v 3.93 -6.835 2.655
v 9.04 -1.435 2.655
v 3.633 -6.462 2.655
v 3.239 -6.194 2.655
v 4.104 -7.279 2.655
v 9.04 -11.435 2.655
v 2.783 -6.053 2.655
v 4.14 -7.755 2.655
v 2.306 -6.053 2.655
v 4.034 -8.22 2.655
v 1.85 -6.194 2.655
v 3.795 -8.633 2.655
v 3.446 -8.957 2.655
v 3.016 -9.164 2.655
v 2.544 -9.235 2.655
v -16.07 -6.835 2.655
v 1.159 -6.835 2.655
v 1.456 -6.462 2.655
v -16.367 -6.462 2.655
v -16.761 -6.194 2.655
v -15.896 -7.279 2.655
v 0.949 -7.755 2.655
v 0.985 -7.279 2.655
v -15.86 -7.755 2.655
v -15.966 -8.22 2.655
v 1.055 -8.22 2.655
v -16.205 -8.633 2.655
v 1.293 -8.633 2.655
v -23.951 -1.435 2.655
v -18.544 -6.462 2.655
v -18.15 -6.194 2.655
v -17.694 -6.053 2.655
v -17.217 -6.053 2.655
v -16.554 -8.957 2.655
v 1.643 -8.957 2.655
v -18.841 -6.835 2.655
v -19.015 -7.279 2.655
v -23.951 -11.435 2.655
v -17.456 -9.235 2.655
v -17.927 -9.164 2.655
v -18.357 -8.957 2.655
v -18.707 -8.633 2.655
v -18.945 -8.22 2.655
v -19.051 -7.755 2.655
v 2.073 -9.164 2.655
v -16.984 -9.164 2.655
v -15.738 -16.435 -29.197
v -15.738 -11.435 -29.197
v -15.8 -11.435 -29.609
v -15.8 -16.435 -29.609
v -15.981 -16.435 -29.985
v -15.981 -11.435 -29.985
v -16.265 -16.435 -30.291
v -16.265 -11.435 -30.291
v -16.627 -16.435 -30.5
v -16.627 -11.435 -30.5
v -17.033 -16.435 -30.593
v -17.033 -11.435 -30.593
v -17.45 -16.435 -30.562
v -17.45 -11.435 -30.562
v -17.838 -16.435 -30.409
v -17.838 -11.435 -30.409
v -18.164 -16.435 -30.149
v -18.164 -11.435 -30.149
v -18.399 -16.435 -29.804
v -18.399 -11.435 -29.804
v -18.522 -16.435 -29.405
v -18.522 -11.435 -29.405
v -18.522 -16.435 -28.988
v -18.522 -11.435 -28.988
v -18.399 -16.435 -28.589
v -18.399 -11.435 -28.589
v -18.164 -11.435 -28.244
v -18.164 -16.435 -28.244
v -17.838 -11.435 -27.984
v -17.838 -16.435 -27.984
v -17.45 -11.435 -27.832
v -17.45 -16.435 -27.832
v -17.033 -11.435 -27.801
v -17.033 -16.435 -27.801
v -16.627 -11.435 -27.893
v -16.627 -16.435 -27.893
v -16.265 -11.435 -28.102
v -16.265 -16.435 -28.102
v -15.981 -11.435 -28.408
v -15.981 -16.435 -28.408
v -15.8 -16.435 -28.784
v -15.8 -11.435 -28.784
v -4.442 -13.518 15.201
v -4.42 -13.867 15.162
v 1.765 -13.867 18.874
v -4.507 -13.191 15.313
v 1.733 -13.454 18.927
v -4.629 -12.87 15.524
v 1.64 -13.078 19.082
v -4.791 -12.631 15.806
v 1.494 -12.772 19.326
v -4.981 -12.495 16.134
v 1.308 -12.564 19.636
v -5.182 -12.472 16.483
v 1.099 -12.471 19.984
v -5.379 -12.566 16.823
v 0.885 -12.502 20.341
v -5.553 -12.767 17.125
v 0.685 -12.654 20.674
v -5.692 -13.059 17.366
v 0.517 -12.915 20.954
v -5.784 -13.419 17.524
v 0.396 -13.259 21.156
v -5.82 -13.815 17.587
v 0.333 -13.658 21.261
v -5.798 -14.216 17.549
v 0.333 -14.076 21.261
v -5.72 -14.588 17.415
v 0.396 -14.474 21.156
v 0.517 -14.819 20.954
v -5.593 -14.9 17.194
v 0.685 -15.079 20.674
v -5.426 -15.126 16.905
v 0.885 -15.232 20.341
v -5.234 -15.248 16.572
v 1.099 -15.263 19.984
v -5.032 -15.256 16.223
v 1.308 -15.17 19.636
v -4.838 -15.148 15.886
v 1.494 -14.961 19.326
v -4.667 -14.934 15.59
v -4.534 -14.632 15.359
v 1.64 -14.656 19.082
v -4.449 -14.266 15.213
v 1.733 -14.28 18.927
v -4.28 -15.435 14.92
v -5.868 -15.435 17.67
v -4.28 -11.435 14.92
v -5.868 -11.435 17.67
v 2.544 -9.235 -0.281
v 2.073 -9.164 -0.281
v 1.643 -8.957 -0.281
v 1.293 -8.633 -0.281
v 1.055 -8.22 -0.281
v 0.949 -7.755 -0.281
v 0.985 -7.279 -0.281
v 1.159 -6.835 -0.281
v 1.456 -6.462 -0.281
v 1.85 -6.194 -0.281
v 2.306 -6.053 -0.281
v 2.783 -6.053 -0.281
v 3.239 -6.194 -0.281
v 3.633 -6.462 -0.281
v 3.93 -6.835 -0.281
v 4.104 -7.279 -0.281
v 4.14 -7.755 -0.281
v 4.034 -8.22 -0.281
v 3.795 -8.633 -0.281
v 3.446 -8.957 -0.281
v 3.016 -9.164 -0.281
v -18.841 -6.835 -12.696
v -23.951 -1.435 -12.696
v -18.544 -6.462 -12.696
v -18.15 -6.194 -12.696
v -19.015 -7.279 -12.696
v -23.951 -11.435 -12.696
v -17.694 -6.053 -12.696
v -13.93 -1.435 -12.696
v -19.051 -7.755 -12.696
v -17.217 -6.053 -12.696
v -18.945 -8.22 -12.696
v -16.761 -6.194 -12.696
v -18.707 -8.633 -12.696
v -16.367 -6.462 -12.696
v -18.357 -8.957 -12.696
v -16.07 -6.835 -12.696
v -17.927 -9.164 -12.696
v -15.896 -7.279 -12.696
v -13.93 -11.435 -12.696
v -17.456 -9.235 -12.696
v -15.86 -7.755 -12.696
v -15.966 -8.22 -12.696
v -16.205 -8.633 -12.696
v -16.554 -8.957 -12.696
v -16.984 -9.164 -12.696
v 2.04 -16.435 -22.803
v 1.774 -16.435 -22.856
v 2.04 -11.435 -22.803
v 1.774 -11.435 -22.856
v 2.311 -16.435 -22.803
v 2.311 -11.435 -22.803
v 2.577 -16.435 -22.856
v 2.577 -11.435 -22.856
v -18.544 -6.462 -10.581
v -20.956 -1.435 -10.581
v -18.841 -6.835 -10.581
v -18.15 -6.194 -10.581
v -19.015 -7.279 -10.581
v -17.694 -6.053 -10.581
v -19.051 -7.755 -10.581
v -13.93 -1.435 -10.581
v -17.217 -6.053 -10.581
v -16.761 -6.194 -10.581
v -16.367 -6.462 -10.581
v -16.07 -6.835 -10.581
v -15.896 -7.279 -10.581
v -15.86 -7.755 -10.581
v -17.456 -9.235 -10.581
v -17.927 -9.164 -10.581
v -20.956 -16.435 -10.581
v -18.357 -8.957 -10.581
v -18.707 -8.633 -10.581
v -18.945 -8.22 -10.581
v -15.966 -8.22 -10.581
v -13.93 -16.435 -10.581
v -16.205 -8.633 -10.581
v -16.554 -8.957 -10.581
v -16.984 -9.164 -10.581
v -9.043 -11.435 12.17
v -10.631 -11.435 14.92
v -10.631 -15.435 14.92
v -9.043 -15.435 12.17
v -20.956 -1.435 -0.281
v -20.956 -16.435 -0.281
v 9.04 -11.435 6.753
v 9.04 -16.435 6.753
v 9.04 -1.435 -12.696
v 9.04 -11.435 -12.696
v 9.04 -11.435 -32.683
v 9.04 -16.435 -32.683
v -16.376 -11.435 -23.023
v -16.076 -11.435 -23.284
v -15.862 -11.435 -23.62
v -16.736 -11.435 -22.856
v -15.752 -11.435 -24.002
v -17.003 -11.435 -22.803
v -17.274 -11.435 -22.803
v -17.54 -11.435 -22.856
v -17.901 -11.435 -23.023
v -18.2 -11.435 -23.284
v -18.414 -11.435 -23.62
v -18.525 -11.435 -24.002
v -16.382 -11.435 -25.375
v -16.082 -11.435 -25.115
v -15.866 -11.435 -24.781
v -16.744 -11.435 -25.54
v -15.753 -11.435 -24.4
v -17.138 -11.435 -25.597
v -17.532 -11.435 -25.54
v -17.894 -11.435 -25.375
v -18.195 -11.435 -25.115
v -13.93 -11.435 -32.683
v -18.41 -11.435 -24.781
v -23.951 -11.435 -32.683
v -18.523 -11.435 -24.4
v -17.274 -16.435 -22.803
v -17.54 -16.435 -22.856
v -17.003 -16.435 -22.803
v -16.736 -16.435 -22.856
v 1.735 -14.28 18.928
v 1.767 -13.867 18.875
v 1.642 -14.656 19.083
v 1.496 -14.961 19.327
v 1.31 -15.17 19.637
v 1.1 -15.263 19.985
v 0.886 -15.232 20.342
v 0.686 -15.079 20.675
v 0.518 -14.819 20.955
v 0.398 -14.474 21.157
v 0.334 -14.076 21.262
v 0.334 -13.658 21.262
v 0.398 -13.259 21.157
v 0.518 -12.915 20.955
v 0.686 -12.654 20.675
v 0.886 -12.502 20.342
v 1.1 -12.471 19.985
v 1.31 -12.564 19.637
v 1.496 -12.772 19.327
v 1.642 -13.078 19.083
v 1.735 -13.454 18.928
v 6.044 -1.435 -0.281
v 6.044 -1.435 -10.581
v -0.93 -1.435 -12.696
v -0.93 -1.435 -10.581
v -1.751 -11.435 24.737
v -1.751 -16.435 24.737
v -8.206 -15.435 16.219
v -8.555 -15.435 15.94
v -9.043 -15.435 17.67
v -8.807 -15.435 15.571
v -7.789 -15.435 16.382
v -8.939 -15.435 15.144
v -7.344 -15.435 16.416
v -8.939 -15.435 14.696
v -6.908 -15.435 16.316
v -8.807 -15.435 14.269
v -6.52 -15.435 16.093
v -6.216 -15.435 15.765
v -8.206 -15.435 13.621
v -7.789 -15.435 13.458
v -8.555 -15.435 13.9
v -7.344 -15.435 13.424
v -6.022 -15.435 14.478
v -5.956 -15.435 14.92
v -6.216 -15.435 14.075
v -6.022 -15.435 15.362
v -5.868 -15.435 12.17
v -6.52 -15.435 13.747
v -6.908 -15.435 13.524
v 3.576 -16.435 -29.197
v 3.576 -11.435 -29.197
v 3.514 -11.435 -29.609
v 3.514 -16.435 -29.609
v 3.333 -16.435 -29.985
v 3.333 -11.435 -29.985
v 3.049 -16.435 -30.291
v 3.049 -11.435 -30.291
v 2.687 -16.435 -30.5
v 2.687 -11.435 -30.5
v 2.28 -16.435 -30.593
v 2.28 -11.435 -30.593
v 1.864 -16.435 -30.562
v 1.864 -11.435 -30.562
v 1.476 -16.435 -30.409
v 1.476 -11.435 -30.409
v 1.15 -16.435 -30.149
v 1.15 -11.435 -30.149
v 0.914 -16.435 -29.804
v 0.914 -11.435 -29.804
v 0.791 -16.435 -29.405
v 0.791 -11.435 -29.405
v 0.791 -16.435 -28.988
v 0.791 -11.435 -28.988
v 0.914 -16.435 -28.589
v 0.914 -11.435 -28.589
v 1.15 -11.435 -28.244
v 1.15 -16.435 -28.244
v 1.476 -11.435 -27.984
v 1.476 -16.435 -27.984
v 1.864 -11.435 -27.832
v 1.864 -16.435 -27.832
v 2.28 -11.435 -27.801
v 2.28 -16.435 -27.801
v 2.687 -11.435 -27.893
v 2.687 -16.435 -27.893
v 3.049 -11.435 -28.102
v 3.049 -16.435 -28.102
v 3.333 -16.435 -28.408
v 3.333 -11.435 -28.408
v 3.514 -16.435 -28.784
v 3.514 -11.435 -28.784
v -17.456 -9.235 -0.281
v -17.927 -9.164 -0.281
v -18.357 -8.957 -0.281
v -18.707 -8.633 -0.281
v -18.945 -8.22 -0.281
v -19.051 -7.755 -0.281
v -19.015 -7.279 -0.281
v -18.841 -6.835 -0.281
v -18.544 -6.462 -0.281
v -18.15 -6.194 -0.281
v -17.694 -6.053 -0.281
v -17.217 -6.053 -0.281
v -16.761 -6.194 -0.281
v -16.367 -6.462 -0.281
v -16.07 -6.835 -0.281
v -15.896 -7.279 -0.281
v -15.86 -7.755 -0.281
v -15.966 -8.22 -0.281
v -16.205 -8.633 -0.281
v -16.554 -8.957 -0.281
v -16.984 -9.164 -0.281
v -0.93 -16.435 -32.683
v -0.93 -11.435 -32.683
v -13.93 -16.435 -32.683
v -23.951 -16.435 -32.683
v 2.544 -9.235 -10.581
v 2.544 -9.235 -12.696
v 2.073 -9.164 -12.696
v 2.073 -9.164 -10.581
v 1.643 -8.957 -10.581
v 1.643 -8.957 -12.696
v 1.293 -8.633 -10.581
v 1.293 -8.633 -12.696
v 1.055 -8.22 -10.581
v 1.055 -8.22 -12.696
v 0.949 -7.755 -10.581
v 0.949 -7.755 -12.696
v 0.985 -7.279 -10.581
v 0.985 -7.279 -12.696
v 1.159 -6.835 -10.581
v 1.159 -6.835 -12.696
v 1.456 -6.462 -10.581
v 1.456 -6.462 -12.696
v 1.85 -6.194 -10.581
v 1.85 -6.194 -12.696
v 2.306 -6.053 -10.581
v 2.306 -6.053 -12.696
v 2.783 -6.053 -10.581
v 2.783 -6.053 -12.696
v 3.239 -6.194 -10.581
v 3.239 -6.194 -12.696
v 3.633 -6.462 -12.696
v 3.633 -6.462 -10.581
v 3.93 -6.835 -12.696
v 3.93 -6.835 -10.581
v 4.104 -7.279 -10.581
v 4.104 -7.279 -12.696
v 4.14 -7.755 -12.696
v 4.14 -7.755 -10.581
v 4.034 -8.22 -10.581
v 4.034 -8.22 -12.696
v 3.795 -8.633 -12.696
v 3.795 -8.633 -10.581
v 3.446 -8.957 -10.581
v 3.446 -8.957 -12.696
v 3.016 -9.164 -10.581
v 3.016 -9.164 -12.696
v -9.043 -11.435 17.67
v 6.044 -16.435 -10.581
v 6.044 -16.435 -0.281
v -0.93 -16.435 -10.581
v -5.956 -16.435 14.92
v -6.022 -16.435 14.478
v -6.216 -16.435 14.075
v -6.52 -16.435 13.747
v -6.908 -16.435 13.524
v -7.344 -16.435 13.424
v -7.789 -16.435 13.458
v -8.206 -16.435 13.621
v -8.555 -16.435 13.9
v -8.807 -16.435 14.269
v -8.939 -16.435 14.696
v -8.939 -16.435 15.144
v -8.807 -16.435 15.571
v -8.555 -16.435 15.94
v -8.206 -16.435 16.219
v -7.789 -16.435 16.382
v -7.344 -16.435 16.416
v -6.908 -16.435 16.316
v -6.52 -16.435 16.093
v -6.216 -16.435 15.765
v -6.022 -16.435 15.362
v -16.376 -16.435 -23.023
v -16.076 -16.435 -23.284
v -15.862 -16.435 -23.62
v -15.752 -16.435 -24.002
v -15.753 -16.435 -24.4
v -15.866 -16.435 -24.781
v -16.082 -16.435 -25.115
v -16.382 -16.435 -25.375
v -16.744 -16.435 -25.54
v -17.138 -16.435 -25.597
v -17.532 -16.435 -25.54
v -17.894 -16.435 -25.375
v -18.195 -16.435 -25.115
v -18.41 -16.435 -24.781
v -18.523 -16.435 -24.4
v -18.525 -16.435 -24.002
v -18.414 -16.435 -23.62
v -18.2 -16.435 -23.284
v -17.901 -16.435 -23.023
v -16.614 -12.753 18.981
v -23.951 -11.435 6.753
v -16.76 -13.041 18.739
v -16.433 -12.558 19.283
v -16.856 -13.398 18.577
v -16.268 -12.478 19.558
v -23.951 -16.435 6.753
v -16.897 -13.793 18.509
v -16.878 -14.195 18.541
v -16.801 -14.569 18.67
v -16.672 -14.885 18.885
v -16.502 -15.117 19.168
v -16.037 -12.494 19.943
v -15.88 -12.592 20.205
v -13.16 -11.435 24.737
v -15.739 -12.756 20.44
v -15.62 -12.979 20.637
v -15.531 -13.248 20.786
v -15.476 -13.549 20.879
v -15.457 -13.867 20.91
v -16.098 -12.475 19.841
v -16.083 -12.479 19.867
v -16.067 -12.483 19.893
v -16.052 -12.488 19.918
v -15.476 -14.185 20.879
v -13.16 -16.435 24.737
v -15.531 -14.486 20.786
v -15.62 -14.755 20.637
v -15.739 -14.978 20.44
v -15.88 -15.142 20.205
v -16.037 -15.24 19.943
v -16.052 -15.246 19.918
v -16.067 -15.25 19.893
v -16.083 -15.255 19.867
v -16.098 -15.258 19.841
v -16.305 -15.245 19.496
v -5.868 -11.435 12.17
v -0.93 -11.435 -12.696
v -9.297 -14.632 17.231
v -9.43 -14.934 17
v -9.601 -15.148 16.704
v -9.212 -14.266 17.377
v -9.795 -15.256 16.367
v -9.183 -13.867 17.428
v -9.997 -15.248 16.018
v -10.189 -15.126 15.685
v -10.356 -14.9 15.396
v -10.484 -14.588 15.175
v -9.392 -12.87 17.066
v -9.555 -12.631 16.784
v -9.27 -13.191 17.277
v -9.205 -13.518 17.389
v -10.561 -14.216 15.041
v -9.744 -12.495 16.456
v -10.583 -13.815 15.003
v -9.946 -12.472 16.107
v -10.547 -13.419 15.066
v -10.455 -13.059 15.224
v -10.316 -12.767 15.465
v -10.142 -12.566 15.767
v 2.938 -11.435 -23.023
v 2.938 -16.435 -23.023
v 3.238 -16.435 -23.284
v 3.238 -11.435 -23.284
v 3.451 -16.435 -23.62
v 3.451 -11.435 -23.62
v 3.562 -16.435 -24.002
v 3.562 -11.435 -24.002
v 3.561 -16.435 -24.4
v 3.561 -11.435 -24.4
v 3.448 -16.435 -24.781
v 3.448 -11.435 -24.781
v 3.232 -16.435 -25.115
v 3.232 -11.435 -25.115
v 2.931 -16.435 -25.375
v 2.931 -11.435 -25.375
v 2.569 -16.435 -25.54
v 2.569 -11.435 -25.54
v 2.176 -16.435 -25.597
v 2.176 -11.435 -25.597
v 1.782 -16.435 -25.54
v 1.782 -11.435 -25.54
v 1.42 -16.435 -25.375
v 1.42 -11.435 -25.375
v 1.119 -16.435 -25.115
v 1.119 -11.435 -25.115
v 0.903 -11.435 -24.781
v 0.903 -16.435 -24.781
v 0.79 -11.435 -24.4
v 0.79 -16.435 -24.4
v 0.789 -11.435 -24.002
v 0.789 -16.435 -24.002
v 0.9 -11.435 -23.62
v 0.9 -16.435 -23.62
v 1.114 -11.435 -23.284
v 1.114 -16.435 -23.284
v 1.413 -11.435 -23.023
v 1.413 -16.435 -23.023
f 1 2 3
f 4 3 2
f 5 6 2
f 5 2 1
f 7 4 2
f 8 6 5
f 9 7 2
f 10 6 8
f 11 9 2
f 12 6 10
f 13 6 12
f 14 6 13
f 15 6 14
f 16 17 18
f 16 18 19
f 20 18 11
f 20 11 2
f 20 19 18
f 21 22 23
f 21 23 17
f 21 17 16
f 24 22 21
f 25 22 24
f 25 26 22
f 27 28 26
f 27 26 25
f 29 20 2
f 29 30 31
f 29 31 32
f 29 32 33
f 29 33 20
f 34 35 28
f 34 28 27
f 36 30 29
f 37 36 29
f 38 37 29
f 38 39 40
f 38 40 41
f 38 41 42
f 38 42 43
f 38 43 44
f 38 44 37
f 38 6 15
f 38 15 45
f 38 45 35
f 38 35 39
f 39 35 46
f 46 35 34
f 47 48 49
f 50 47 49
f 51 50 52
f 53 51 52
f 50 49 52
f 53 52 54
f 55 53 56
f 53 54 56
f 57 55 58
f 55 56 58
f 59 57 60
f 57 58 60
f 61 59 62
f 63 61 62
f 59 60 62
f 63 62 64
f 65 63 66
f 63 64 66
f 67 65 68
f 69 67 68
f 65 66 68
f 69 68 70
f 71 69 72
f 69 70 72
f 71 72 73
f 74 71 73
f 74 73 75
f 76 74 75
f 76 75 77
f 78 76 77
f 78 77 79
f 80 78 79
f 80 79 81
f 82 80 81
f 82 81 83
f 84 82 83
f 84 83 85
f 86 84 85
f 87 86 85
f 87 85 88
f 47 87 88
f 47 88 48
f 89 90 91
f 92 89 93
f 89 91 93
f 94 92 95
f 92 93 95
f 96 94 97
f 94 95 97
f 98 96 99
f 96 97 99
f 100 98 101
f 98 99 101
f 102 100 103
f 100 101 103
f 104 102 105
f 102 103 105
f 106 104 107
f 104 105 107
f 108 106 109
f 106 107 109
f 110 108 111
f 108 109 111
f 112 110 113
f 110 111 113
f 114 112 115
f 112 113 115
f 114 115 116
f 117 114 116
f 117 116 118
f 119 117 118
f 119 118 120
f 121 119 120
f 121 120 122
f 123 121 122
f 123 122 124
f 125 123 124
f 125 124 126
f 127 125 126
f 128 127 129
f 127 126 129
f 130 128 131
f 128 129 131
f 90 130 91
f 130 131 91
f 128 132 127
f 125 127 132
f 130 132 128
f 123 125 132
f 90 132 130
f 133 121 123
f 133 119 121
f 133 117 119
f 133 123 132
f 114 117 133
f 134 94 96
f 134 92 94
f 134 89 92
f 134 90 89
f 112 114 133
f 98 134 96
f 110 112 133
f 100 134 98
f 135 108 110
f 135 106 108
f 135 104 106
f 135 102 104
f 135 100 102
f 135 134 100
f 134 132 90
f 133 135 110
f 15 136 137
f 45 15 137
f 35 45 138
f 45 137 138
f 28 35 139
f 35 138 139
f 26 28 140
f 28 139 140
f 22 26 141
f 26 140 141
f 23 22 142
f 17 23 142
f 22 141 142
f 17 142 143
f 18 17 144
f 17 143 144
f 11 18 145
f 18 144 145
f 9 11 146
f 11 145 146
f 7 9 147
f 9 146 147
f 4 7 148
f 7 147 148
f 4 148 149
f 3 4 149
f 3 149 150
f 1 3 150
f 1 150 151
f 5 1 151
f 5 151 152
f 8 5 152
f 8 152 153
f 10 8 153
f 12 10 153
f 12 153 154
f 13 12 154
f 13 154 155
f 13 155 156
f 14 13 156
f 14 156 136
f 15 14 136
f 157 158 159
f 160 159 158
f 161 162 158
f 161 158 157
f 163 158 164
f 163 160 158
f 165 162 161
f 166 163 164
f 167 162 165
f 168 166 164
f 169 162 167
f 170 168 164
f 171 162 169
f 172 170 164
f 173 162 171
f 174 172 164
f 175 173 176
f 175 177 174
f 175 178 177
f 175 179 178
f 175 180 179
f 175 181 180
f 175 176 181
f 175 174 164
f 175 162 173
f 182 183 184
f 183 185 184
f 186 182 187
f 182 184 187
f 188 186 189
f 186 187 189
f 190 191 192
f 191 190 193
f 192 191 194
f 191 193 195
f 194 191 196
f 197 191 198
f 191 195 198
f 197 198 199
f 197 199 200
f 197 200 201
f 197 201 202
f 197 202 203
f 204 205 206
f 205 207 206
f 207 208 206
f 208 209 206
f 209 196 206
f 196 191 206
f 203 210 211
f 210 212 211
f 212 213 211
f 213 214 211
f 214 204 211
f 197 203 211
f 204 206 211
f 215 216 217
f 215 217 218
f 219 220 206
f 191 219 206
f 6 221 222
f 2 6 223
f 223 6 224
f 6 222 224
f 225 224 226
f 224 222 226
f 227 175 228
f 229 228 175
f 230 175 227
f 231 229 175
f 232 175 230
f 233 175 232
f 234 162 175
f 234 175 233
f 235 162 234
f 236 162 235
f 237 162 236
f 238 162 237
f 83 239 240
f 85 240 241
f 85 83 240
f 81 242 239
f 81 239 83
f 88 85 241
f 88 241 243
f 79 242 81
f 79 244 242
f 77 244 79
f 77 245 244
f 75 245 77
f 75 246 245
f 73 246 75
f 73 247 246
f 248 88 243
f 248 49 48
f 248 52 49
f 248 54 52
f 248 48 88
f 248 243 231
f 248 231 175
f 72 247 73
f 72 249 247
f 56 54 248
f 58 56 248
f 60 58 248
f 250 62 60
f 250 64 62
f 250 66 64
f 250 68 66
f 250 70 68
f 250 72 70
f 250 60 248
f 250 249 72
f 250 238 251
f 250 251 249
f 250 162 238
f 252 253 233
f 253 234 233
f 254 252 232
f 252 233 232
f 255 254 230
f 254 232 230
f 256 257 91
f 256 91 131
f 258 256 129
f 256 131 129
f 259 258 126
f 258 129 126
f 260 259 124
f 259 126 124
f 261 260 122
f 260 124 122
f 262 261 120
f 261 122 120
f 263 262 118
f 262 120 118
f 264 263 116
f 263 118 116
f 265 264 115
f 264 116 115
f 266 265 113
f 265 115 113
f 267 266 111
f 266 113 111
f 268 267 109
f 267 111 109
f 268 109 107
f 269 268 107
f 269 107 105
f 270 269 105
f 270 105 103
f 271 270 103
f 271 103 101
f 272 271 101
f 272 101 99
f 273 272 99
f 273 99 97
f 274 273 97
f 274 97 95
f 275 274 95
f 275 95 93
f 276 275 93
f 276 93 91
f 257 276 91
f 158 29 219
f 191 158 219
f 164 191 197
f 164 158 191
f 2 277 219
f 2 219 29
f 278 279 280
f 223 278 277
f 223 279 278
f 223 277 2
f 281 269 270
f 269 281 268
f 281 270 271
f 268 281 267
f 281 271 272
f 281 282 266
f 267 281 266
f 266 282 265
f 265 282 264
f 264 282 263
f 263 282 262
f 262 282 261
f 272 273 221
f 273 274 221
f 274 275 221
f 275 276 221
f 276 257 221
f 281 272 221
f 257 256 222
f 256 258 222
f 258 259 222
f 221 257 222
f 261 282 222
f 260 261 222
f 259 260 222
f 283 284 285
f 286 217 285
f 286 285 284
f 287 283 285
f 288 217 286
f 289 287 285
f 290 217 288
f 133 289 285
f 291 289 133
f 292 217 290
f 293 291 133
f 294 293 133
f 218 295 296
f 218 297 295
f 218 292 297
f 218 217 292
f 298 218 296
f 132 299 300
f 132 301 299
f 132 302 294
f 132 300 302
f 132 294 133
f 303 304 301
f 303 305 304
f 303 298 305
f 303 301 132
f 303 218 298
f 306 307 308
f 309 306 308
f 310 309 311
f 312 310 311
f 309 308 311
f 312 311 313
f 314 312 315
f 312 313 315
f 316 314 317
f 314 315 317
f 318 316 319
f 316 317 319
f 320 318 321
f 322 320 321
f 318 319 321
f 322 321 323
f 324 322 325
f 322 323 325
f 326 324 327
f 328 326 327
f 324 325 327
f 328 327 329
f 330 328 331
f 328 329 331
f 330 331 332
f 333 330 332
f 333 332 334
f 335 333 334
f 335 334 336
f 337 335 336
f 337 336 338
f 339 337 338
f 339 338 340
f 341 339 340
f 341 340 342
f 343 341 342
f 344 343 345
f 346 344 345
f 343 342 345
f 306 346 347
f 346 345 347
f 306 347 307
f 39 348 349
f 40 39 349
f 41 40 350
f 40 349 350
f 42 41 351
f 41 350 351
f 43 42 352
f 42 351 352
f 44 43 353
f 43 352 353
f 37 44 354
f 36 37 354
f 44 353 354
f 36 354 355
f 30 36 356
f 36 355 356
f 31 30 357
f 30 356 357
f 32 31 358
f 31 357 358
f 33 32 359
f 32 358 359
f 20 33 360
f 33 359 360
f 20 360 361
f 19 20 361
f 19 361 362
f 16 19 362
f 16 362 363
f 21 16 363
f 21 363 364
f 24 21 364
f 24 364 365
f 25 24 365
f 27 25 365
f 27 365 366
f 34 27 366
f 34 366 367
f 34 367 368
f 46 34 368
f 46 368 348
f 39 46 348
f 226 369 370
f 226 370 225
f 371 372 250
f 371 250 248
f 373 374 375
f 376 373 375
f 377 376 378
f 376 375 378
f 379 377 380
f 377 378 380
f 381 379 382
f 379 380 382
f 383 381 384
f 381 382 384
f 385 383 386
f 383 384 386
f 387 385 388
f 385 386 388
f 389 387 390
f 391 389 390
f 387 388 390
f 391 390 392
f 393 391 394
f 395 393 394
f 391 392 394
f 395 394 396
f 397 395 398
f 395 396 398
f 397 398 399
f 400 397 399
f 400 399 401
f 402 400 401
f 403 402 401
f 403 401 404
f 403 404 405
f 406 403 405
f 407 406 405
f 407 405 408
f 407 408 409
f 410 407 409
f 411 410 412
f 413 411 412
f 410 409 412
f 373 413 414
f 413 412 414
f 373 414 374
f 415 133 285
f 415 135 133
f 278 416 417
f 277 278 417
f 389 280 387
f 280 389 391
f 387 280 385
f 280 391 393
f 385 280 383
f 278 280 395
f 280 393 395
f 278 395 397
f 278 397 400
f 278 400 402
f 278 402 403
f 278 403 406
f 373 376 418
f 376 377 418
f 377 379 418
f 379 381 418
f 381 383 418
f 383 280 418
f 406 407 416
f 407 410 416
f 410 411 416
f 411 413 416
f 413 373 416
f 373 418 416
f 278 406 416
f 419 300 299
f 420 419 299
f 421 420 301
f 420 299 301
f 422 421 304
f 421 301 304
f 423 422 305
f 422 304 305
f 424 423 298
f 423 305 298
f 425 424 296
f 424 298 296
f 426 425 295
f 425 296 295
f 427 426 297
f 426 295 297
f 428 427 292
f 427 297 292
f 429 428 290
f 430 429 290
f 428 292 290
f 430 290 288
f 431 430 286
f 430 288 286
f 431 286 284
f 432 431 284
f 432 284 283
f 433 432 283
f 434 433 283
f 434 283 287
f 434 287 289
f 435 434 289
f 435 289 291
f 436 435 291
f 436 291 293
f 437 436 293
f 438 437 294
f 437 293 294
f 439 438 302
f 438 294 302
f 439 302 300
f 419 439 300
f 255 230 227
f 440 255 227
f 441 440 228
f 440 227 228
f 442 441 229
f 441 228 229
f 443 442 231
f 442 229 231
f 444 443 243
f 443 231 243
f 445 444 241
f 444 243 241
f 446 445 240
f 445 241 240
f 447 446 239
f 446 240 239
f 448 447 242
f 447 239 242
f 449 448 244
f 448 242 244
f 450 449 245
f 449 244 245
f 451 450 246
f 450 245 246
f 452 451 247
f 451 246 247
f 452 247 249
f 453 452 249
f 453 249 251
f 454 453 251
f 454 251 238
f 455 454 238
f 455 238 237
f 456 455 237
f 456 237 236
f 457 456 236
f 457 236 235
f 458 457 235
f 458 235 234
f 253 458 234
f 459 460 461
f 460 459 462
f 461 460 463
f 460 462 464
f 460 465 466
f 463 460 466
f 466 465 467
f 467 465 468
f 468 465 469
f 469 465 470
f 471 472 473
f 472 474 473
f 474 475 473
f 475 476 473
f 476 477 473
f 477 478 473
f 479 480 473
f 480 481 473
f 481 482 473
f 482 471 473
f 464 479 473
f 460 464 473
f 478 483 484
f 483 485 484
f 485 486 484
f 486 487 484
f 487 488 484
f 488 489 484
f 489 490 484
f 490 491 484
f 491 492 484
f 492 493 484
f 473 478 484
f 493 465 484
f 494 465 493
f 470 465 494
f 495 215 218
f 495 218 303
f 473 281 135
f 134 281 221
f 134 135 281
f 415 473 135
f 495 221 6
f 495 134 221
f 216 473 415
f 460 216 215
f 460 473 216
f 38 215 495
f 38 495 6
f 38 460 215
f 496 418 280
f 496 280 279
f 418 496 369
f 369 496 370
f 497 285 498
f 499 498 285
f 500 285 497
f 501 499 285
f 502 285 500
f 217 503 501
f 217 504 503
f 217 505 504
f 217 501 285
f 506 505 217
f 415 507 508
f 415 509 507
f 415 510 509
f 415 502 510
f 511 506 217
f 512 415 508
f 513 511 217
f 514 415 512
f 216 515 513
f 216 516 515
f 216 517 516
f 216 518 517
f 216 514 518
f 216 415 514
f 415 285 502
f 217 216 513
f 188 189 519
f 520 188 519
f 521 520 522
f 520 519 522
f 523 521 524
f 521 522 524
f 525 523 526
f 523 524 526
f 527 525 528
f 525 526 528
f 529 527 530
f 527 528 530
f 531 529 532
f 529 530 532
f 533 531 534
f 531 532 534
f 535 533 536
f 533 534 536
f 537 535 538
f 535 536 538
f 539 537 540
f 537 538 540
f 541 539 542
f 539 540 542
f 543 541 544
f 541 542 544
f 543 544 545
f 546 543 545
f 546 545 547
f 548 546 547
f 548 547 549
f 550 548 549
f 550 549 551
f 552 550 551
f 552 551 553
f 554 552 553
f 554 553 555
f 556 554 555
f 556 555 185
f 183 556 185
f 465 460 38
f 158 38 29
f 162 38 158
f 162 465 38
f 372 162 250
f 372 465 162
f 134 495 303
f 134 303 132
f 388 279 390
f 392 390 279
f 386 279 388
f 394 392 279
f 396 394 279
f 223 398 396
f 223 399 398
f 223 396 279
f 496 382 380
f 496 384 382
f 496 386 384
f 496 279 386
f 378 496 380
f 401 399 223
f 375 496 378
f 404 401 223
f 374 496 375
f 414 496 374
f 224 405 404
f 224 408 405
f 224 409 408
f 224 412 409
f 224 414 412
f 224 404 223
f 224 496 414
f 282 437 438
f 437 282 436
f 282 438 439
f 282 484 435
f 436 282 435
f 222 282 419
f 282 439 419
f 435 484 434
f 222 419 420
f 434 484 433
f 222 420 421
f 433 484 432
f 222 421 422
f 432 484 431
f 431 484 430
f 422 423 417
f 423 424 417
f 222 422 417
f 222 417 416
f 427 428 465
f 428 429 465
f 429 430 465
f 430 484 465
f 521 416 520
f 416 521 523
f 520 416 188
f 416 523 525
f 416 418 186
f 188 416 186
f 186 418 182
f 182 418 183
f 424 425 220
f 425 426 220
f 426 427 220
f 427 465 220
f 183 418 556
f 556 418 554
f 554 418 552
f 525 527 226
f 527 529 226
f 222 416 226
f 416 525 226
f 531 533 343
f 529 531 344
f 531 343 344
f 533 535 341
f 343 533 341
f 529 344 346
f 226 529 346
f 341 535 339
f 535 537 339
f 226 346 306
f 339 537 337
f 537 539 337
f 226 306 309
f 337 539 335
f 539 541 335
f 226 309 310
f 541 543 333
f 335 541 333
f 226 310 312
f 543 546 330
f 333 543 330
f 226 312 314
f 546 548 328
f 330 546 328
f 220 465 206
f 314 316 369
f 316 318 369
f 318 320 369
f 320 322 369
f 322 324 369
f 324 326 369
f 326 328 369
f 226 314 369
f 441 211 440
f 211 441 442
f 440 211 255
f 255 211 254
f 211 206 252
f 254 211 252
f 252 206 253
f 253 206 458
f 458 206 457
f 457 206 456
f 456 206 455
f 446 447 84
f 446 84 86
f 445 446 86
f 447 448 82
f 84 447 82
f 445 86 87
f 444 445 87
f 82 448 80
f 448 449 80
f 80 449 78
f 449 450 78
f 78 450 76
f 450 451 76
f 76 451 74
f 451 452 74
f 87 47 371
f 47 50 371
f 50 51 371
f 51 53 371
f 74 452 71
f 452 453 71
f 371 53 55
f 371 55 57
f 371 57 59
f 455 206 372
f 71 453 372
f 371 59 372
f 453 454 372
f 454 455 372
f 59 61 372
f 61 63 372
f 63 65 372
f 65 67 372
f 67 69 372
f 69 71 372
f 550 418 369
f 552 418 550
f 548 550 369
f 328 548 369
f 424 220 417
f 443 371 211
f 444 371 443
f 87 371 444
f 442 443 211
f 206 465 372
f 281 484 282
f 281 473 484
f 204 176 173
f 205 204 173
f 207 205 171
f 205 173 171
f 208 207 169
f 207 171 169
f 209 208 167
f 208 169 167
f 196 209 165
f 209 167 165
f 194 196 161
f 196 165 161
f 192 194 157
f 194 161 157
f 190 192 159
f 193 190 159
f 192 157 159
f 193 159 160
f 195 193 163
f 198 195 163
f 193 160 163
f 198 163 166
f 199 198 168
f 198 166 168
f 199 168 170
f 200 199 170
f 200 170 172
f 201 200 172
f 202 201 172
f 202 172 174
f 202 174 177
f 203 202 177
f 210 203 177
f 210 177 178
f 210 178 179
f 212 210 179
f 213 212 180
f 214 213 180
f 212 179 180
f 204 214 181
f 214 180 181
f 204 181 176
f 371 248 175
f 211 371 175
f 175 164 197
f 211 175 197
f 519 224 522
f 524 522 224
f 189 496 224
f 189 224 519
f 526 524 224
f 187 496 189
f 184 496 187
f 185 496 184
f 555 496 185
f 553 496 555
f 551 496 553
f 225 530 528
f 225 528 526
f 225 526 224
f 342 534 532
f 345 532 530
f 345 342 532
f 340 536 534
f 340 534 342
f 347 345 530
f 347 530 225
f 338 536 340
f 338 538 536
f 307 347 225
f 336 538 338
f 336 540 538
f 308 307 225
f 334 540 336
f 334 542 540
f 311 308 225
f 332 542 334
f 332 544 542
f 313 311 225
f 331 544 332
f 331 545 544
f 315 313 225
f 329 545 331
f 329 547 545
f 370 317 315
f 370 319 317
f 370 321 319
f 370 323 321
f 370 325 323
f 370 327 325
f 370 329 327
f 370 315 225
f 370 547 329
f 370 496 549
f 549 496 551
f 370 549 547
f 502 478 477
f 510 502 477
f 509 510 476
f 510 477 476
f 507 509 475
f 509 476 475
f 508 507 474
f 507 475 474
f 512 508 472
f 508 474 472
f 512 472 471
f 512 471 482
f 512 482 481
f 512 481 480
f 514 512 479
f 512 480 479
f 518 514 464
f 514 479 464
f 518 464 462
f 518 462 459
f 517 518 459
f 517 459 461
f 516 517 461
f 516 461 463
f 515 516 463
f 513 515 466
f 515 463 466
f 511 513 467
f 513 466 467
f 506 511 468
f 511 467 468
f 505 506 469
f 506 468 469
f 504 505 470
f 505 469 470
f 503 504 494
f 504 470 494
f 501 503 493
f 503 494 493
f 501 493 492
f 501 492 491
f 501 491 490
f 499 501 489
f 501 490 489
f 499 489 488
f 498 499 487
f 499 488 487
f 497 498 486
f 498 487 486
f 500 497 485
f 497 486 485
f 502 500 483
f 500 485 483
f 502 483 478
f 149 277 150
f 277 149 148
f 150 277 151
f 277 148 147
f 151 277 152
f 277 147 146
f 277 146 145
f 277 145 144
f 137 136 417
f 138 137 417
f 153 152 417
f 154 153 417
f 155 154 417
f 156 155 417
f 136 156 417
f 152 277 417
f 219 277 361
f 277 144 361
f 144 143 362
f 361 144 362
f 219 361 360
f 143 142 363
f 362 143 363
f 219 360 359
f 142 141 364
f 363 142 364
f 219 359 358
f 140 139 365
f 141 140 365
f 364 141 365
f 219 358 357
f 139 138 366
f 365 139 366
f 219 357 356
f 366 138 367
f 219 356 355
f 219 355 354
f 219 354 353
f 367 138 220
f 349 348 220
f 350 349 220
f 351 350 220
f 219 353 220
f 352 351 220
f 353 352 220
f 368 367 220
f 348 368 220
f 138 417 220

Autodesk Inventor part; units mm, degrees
ref_plane "YZ Plane" through (0, 0, 0) normal (1, 0, 0) x (0, 1, 0)
ref_plane "XZ Plane" through (0, 0, 0) normal (0, 1, 0) x (-1, 0, 0)
ref_plane "XY Plane" through (0, 0, 0) normal (0, 0, 1) x (1, 0, 0)
ref_plane "Work Plane8" through (-7.4556, -16.4352, 24.63) normal (0, 1, 0) x (0, 0, -1)
sketch "Sketch12" plane through (-7.4556, -16.4352, 24.63) normal (0, 1, 0) x (0, 0, -1)
  line L0 (59.1648, 4.9103) -> (72.1552, 12.4103) construction
  arc A0 (80.66, 7.5) -> (72.1552, 12.4103) centre (70.66, 0) ccw construction
  line L1 (80.66, 7.5) -> (80.66, -7.5) construction
  arc A1 (72.1552, -12.4103) -> (80.66, -7.5) centre (70.66, 0) ccw construction
  line L2 (72.1552, -12.4103) -> (59.1648, -4.9103) construction
  arc A2 (59.1648, 4.9103) -> (59.1648, -4.9103) centre (70.66, 0) ccw construction
  line L3 (57.3131, 5.945) -> (46.6951, 5.945) construction
  line L4 (46.6951, 5.945) -> (46.6951, -5.9961)
  line L5 (46.6951, -5.9961) -> (57.3131, -5.9961)
  line L6 (57.3131, -5.9961) -> (57.3131, -15)
  line L7 (57.3131, -15) -> (85.66, -15) construction
  line L8 (85.66, -15) -> (85.66, 15) construction
  line L9 (85.66, 15) -> (57.3131, 15) construction
  line L10 (57.3131, 15) -> (57.3131, 5.945) construction
  line L11 (46.6951, -6.3061) -> (57.3131, -6.3061)
  line L12 (41.63, -16.87) -> (45.71, -16.87) projected
  line L13 (55.66, -15) -> (46.2855, -13.3689) projected
  line L14 (55.66, -15) -> (105.1976, -15) construction
  line L15 (46.6951, 0) -> (46.6951, -6.3061)
  line L16 (9.71, -3.1754) -> (12.46, -1.5877) construction
  line L17 (12.46, -1.5877) -> (12.46, 1.5877) construction
  line L18 (12.46, 1.5877) -> (9.71, 3.1754) construction
  line L19 (9.71, 3.1754) -> (6.96, 1.5877) construction
  line L20 (6.96, 1.5877) -> (6.96, -1.5877) construction
  line L21 (6.96, -1.5877) -> (9.71, -3.1754) construction
  line L22 (-3.79, -3.4952) -> (-3.79, 3.4952)
  line L23 (-3.79, 0) -> (-3.79, 0)
  line L24 (-3.79, 0) -> (-3.79, -3.4952)
  line L25 (-3.79, -3.4952) -> (17.8767, -16.4952)
  line L26 (46.6951, 0) -> (-3.79, 0)
  line L27 (57.3131, -6.3061) -> (57.3131, -15)
  line L28 (-3.79, -8.16) -> (-3.79, 8.16) projected
  line L29 (19.46, 16.4952) -> (10.1021, 16.4952) projected
  line L30 (19.46, -16.4952) -> (19.46, 16.4952) projected
  line L31 (10.1021, -16.4952) -> (19.46, -16.4952) projected
  line L32 (10.1021, 16.4952) -> (-3.79, 8.16) projected
  line L33 (-3.79, -8.16) -> (10.1021, -16.4952) projected
  line L34 (17.8767, -16.4952) -> (57.3131, -16.4952)
  line L35 (57.3131, -16.4952) -> (57.3131, -15)
  line L36 (57.3131, -15) -> (37.3669, -15)
  line L37 (39.63, 0) -> (49.93, 0)
  line L38 (49.93, 0) -> (49.93, -12.8511)
  line L39 (49.93, -12.8511) -> (39.63, -12.8511)
  line L40 (39.63, -12.8511) -> (39.63, 0)
  line L41 (52.63, -16.0211) -> (18.69, -16.0211) construction
  line L42 (18.69, 17.9189) -> (52.63, 17.9189) projected
  arc A3 (48.3173, -4.8992) -> (48.4594, -5.1011) centre (48.5983, -4.8523) ccw projected
  line L43 (48.4594, -5.1011) -> (52.63, -5.1011) projected
  line L44 (52.63, -5.1011) -> (52.63, 6.9989) projected
  line L45 (48.4594, 6.9989) -> (52.63, 6.9989) projected
  arc A4 (48.4594, 6.9989) -> (48.3173, 6.7971) centre (48.5983, 6.7502) ccw projected
  arc A5 (47.9241, 6.5003) -> (48.3173, 6.7971) centre (47.4153, 7.5832) ccw projected
  arc A6 (47.9241, 6.5003) -> (47.8129, 6.374) centre (48.0446, 6.2821) ccw projected
  line L46 (47.7741, 5.8769) -> (47.8129, 6.374) projected
  arc A7 (47.5555, 5.6489) -> (47.7741, 5.8769) centre (47.5256, 5.8964) ccw projected
  line L47 (47.1044, 5.6489) -> (47.5555, 5.6489) projected
  arc A8 (46.8561, 5.8765) -> (47.1044, 5.6489) centre (47.1044, 5.8982) ccw projected
  line L48 (46.8241, 6.242) -> (46.8561, 5.8765) projected
  arc A9 (46.8241, 6.242) -> (46.6712, 6.5003) centre (46.5764, 6.2698) ccw projected
  arc A10 (46.1533, 6.8443) -> (46.6712, 6.5003) centre (47.0626, 7.6514) ccw projected
  arc A11 (46.1533, 6.8443) -> (45.93, 6.9989) centre (45.9227, 6.7498) ccw projected
  line L49 (45.33, 6.9989) -> (45.93, 6.9989) projected
  line L50 (44.83, 6.4989) -> (45.33, 6.9989) projected
  line L51 (44.83, 6.4989) -> (44.83, -4.6011) projected
  line L52 (44.83, -4.6011) -> (45.33, -5.1011) projected
  line L53 (45.33, -5.1011) -> (45.93, -5.1011) projected
  arc A12 (45.93, -5.1011) -> (46.1533, -4.9464) centre (45.9227, -4.8519) ccw projected
  arc A13 (46.6712, -4.6024) -> (46.1533, -4.9464) centre (47.0626, -5.7535) ccw projected
  arc A14 (46.6712, -4.6024) -> (46.8241, -4.3441) centre (46.5764, -4.3719) ccw projected
  line L54 (46.8241, -4.3441) -> (46.8561, -3.9786) projected
  arc A15 (47.1044, -3.7511) -> (46.8561, -3.9786) centre (47.1044, -4.0003) ccw projected
  line L55 (47.1044, -3.7511) -> (47.5555, -3.7511) projected
  arc A16 (47.7741, -3.9791) -> (47.5555, -3.7511) centre (47.5256, -3.9985) ccw projected
  line L56 (47.7741, -3.9791) -> (47.8129, -4.4761) projected
  arc A17 (47.8129, -4.4761) -> (47.9241, -4.6024) centre (48.0446, -4.3842) ccw projected
  arc A18 (48.3173, -4.8992) -> (47.9241, -4.6024) centre (47.4153, -5.6854) ccw projected
  arc A19 (48.2566, -4.8959) -> (47.7572, -4.3183) centre (47.1462, -5.3511) ccw construction
  arc A20 (47.6355, -4.1249) -> (47.7572, -4.3183) centre (47.8845, -4.1031) ccw construction
  line L57 (47.6355, -4.1249) -> (47.6053, -3.7793) construction
  arc A21 (47.6053, -3.7793) -> (47.3562, -3.5511) centre (47.3562, -3.8011) ccw construction
  line L58 (47.3562, -3.5511) -> (46.9038, -3.5511) construction
  arc A22 (46.9038, -3.5511) -> (46.6547, -3.7793) centre (46.9038, -3.8011) ccw construction
  line L59 (46.6547, -3.7793) -> (46.6227, -4.1458) construction
  arc A23 (46.5068, -4.3356) -> (46.6227, -4.1458) centre (46.3736, -4.124) ccw construction
  arc A24 (46.5068, -4.3356) -> (46.0359, -4.8959) centre (47.1462, -5.3511) ccw construction
  arc A25 (45.8046, -5.0511) -> (46.0359, -4.8959) centre (45.8046, -4.8011) ccw construction
  line L60 (45.8046, -5.0511) -> (45.13, -5.0511) construction
  line L61 (45.13, -5.0511) -> (44.63, -4.5511) construction
  line L62 (44.63, -4.5511) -> (44.63, 6.4489) construction
  line L63 (44.63, 6.4489) -> (45.13, 6.9489) construction
  line L64 (45.13, 6.9489) -> (45.8046, 6.9489) construction
  arc A26 (46.0359, 6.7938) -> (45.8046, 6.9489) centre (45.8046, 6.6989) ccw construction
  arc A27 (46.0359, 6.7938) -> (46.5068, 6.2335) centre (47.1462, 7.2489) ccw construction
  arc A28 (46.6227, 6.0437) -> (46.5068, 6.2335) centre (46.3736, 6.0219) ccw construction
  line L65 (46.6227, 6.0437) -> (46.6547, 5.6771) construction
  arc A29 (46.6547, 5.6771) -> (46.9038, 5.4489) centre (46.9038, 5.6989) ccw construction
  line L66 (46.9038, 5.4489) -> (47.3562, 5.4489) construction
  arc A30 (47.3562, 5.4489) -> (47.6053, 5.6771) centre (47.3562, 5.6989) ccw construction
  line L67 (47.6053, 5.6771) -> (47.6355, 6.0228) construction
  arc A31 (47.7572, 6.2161) -> (47.6355, 6.0228) centre (47.8845, 6.001) ccw construction
  arc A32 (47.7572, 6.2161) -> (48.2566, 6.7938) centre (47.1462, 7.2489) ccw construction
  arc A33 (48.4879, 6.9489) -> (48.2566, 6.7938) centre (48.4879, 6.6989) ccw construction
  line L68 (48.4879, 6.9489) -> (49.63, 6.9489) construction
  line L69 (49.63, 6.9489) -> (49.63, 13.8489) construction
  line L70 (49.63, 13.8489) -> (49.03, 14.4489) construction
  line L71 (49.03, 14.4489) -> (45.63, 14.4489) construction
  arc A34 (44.83, 14.4489) -> (45.63, 14.4489) centre (45.23, 14.7489) ccw construction
  line L72 (44.83, 14.4489) -> (40.23, 14.4489) construction
  line L73 (40.23, 14.4489) -> (39.63, 13.8489) construction
  line L74 (39.63, 13.8489) -> (39.63, 7.3489) construction
  line L75 (39.63, 7.3489) -> (40.03, 6.9489) construction
  line L76 (40.03, 6.9489) -> (40.03, -5.0511) construction
  line L77 (40.03, -5.0511) -> (39.63, -5.4511) construction
  line L78 (39.63, -5.4511) -> (39.63, -11.951) construction
  line L79 (39.63, -11.951) -> (40.23, -12.5511) construction
  line L80 (40.23, -12.5511) -> (49.03, -12.5511) construction
  line L81 (49.03, -12.5511) -> (49.63, -11.9511) construction
  line L82 (49.63, -11.9511) -> (49.63, -5.0511) construction
  line L83 (49.63, -5.0511) -> (48.4879, -5.0511) construction
  arc A35 (48.2566, -4.8959) -> (48.4879, -5.0511) centre (48.4879, -4.8011) ccw construction
  point P0 (24.63, -7.4556)
  point P1 (11.21, -12.4952)
  point P2 (19.46, 12.4952)
  point P3 (19.46, -12.4952)
  dimension "d114" = 5.1011
  dimension "d115" = 6.9989
  dimension "d116" = 0.3
  dimension "d117" = 0.3
  dimension "d123" = 0
extrude "Extrusion11" add sketch "Sketch12" along normal blind 5 contours L37 L38 L43 A3 A18 A17 L56 A16 L55 A15 L54 A14 L4 | L4 A14 A13 A12 L53 L52 L51 L26 | A14 L54 A15 L55 A16 L56 A17 A18 A3 L43 L38 L5 L4 | L4 L15 L11 L38 L39 L40 L26 L51 L52 L53 A12 A13 A14 | L5 L38 L11 L15 | L40 L39 L38 L11 L6 L35 L34 L30 L26 | L30 L31 L25 L22 L26
sketch "Sketch13" plane through (-7.4556, -11.4352, 24.63) normal (0, 1, 0) x (1, 0, 0)
  line L0 (-13.1744, 24.9113) -> (13.5, 24.9113)
  line L1 (13.5, 24.9113) -> (13.5, 35.2113)
  line L2 (13.5, 35.2113) -> (-13.1744, 35.2113)
  line L3 (-13.1744, 35.2113) -> (-13.1744, 24.9113)
  line L4 (-13.5, 34.3113) -> (-13.5, 26.5113) construction
  line L5 (-13.5, 26.5113) -> (-12.3, 25.3113) construction
  line L6 (-12.3, 25.3113) -> (11.7, 25.3113) construction
  line L7 (11.7, 25.3113) -> (12.9, 26.5113) construction
  line L8 (12.9, 26.5113) -> (12.9, 34.3113) construction
  line L9 (12.9, 34.3113) -> (12.3, 34.9113) construction
  line L10 (12.3, 34.9113) -> (5.7, 34.9113) construction
  line L11 (5.7, 34.9113) -> (5.7, 33.7692) construction
  arc A0 (5.5448, 33.5379) -> (5.7, 33.7692) centre (5.45, 33.7692) ccw construction
  arc A1 (5.5448, 33.5379) -> (4.9672, 33.0386) centre (6, 32.4276) ccw construction
  arc A2 (4.7738, 32.9168) -> (4.9672, 33.0386) centre (4.752, 33.1659) ccw construction
  line L12 (4.7738, 32.9168) -> (4.4282, 32.8866) construction
  arc A3 (4.4282, 32.8866) -> (4.2, 32.6375) centre (4.45, 32.6375) ccw construction
  line L13 (4.2, 32.6375) -> (4.2, 32.1851) construction
  arc A4 (4.2, 32.1851) -> (4.4282, 31.9361) centre (4.45, 32.1851) ccw construction
  line L14 (4.4282, 31.9361) -> (4.7947, 31.904) construction
  arc A5 (4.9845, 31.7882) -> (4.7947, 31.904) centre (4.773, 31.6549) ccw construction
  arc A6 (4.9845, 31.7882) -> (5.5448, 31.3172) centre (6, 32.4276) ccw construction
  arc A7 (5.7, 31.0859) -> (5.5448, 31.3172) centre (5.45, 31.0859) ccw construction
  line L15 (5.7, 31.0859) -> (5.7, 30.4113) construction
  line L16 (5.7, 30.4113) -> (5.2, 29.9113) construction
  line L17 (5.2, 29.9113) -> (-5.8, 29.9113) construction
  line L18 (-5.8, 29.9113) -> (-6.3, 30.4113) construction
  line L19 (-6.3, 30.4113) -> (-6.3, 31.0859) construction
  arc A8 (-6.1448, 31.3172) -> (-6.3, 31.0859) centre (-6.05, 31.0859) ccw construction
  arc A9 (-6.1448, 31.3172) -> (-5.5845, 31.7882) centre (-6.6, 32.4276) ccw construction
  arc A10 (-5.3948, 31.904) -> (-5.5845, 31.7882) centre (-5.373, 31.6549) ccw construction
  line L20 (-5.3948, 31.904) -> (-5.0282, 31.9361) construction
  arc A11 (-5.0282, 31.9361) -> (-4.8, 32.1851) centre (-5.05, 32.1851) ccw construction
  line L21 (-4.8, 32.1851) -> (-4.8, 32.6375) construction
  arc A12 (-4.8, 32.6375) -> (-5.0282, 32.8866) centre (-5.05, 32.6375) ccw construction
  line L22 (-5.0282, 32.8866) -> (-5.3738, 32.9168) construction
  arc A13 (-5.5672, 33.0386) -> (-5.3738, 32.9168) centre (-5.352, 33.1659) ccw construction
  arc A14 (-5.5672, 33.0386) -> (-6.1448, 33.5379) centre (-6.6, 32.4276) ccw construction
  arc A15 (-6.3, 33.7692) -> (-6.1448, 33.5379) centre (-6.05, 33.7692) ccw construction
  line L23 (-6.3, 33.7692) -> (-6.3, 34.9113) construction
  line L24 (-6.3, 34.9113) -> (-12.9, 34.9113) construction
  line L25 (-12.9, 34.9113) -> (-13.5, 34.3113) construction
  circle A16 centre (-7.2, 27.9063) radius 2.1 construction
  circle A17 centre (6.6, 27.9063) radius 2.1 construction
  arc A18 (5.5448, 33.5379) -> (4.9672, 33.0386) centre (6, 32.4276) ccw construction
  arc A19 (4.7738, 32.9168) -> (4.9672, 33.0386) centre (4.752, 33.1659) ccw construction
  line L26 (4.7738, 32.9168) -> (4.4282, 32.8866) construction
  arc A20 (4.4282, 32.8866) -> (4.2, 32.6375) centre (4.45, 32.6375) ccw construction
  line L27 (4.2, 32.6375) -> (4.2, 32.1851) construction
  arc A21 (4.2, 32.1851) -> (4.4282, 31.9361) centre (4.45, 32.1851) ccw construction
  line L28 (4.4282, 31.9361) -> (4.7948, 31.904) construction
  arc A22 (4.9845, 31.7882) -> (4.7948, 31.904) centre (4.773, 31.6549) ccw construction
  arc A23 (4.9845, 31.7882) -> (5.5448, 31.3172) centre (6, 32.4276) ccw construction
  arc A24 (5.7, 31.0859) -> (5.5448, 31.3172) centre (5.45, 31.0859) ccw construction
  line L29 (5.7, 31.0859) -> (5.7, 30.4113) construction
  line L30 (5.7, 30.4113) -> (5.2, 29.9113) construction
  line L31 (5.2, 29.9113) -> (-5.8, 29.9113) construction
  line L32 (-5.8, 29.9113) -> (-6.3, 30.4113) construction
  line L33 (-6.3, 30.4113) -> (-6.3, 31.0859) construction
  arc A25 (-6.1448, 31.3172) -> (-6.3, 31.0859) centre (-6.05, 31.0859) ccw construction
  arc A26 (-6.1448, 31.3172) -> (-5.5846, 31.7882) centre (-6.6, 32.4276) ccw construction
  arc A27 (-5.3948, 31.904) -> (-5.5846, 31.7882) centre (-5.373, 31.6549) ccw construction
  line L34 (-5.3948, 31.904) -> (-5.0282, 31.9361) construction
  arc A28 (-5.0282, 31.9361) -> (-4.8, 32.1851) centre (-5.05, 32.1851) ccw construction
  line L35 (-4.8, 32.1851) -> (-4.8, 32.6375) construction
  arc A29 (-4.8, 32.6375) -> (-5.0282, 32.8866) centre (-5.05, 32.6375) ccw construction
  line L36 (-5.0282, 32.8866) -> (-5.3738, 32.9168) construction
  arc A30 (-5.5672, 33.0386) -> (-5.3738, 32.9168) centre (-5.3521, 33.1659) ccw construction
  arc A31 (-5.5672, 33.0386) -> (-6.1448, 33.5379) centre (-6.6, 32.4276) ccw construction
  arc A32 (-6.3, 33.7692) -> (-6.1448, 33.5379) centre (-6.05, 33.7692) ccw construction
  line L37 (-6.3, 33.7692) -> (-6.3, 34.9113) construction
  line L38 (-6.3, 34.9113) -> (-13.2, 34.9113) construction
  line L39 (-13.2, 34.9113) -> (-13.8, 34.3113) construction
  line L40 (-13.8, 34.3113) -> (-13.8, 30.9113) construction
  arc A33 (-13.8, 30.1113) -> (-13.8, 30.9113) centre (-14.1, 30.5113) ccw construction
  line L41 (-13.8, 30.1113) -> (-13.8, 25.5113) construction
  line L42 (-13.8, 25.5113) -> (-13.2, 24.9113) construction
  line L43 (-13.2, 24.9113) -> (-6.7, 24.9113) construction
  line L44 (-6.7, 24.9113) -> (-6.3, 25.3113) construction
  line L45 (-6.3, 25.3113) -> (5.7, 25.3113) construction
  line L46 (5.7, 25.3113) -> (6.1, 24.9113) construction
  line L47 (6.1, 24.9113) -> (12.6, 24.9113) construction
  line L48 (12.6, 24.9113) -> (13.2, 25.5113) construction
  line L49 (13.2, 25.5113) -> (13.2, 34.3113) construction
  line L50 (13.2, 34.3113) -> (12.6, 34.9113) construction
  line L51 (12.6, 34.9113) -> (5.7, 34.9113) construction
  line L52 (5.7, 34.9113) -> (5.7, 33.7692) construction
  arc A34 (5.5448, 33.5379) -> (5.7, 33.7692) centre (5.45, 33.7692) ccw construction
  point P0 (7.4556, 24.63)
  dimension "d110" = 0.3
  dimension "d111" = 0.3
extrude "Extrusion12" cut sketch "Sketch13" against normal through all
mirror "Mirror3" about plane through (-7.4556, -16.4352, -22.0651) normal (-1, 0, 0) of "Extrusion11", "Extrusion12"
sketch "Sketch18" plane through (-7.4556, -11.4352, 24.63) normal (0, 1, 0) x (1, 0, 0)
  line L0 (-16.4952, 17.8767) -> (-16.4952, 57.3131) projected
  line L1 (16.4952, 17.8767) -> (16.4952, 57.3131) projected
  line L2 (16.4952, 25.975) -> (16.4952, 21.975)
  line L3 (16.4952, 21.975) -> (-16.4952, 21.975)
  line L4 (-16.4952, 21.975) -> (-16.4952, 25.975)
  line L5 (15, 37.3669) -> (15, 37.2259) projected
  line L6 (-15, 37.2259) -> (15, 37.2259) construction
  line L7 (-16.4952, 37.3259) -> (16.4952, 37.3259)
  line L8 (16.4952, 17.8767) -> (16.4952, 57.3131) projected
  line L9 (-16.4952, 37.3259) -> (16.4952, 37.3259) construction
  line L10 (-13.5, 35.2113) -> (13.5, 35.2113)
  line L11 (13.5, 35.2113) -> (13.5, 24.9113)
  line L12 (13.5, 24.9113) -> (-13.5, 24.9113)
  line L13 (-13.5, 24.9113) -> (-13.5, 35.2113)
  line L14 (-16.4952, 37.3259) -> (16.4952, 37.3259)
  line L15 (16.4952, 37.3259) -> (16.4952, 21.975)
  line L16 (16.4952, 21.975) -> (-16.4952, 21.975)
  line L17 (-16.4952, 21.975) -> (-16.4952, 37.3259)
  point P0 (7.4556, 24.63)
  dimension "d85" = 4
  dimension "d96" = 0
extrude "Extrusion17" add sketch "Sketch18" along normal blind 10
sketch "Sketch19" plane through (-23.9508, -11.4352, 2.655) normal (0, 0, 1) x (1, 0, 0)
  circle A0 centre (6.4952, 3.8) radius 1.25
  circle A1 centre (26.4952, 3.8) radius 1.5
  point P0 (4.9348, 6.8)
  point P1 (24.9348, 6.8)
hole "Hole1" at (-17.4556, -7.6352, 2.655) at (2.5444, -7.6352, 2.655) direction (0, 0, -1) diameter 3.2 end through all
sketch "Sketch20" plane through (-7.4556, -11.4352, 24.63) normal (0, 1, 0) x (1, 0, 0)
  circle A0 centre (-10.5315, 68.5467) radius 1.4 projected
  circle A1 centre (8.7824, 68.5467) radius 1.4 projected
  arc A2 (-10.1298, 62.2055) -> (-10.9331, 62.2055) centre (-10.5315, 63.5467) ccw projected
  arc A3 (9.1841, 62.2055) -> (8.3808, 62.2055) centre (8.7824, 63.5467) ccw projected
  circle A4 centre (-10.5315, 63.5467) radius 1.4
  circle A5 centre (8.7824, 63.5467) radius 1.4
  point P0 (7.4556, 24.63)
extrude "Extrusion18" cut sketch "Sketch20" against normal blind 10
sketch "Sketch21" plane through (-7.4556, -1.4352, 24.63) normal (0, 1, 0) x (1, 0, 0)
  line L0 (-13.1744, 33.91) -> (-13.1744, 26.11) projected
  line L1 (-13.1744, 26.11) -> (-11.9744, 24.91) projected
  line L2 (-11.9744, 24.91) -> (12.0256, 24.91) projected
  line L3 (12.0256, 24.91) -> (13.2256, 26.11) projected
  line L4 (13.2256, 26.11) -> (13.2256, 33.91) projected
  line L5 (13.2256, 33.91) -> (12.6256, 34.51) projected
  line L6 (12.6256, 34.51) -> (6.0256, 34.51) projected
  line L7 (6.0256, 34.51) -> (6.0256, 33.3679) projected
  arc A0 (5.8704, 33.1366) -> (6.0256, 33.3679) centre (5.7756, 33.3679) ccw projected
  arc A1 (5.8704, 33.1366) -> (5.2928, 32.6373) centre (6.3256, 32.0262) ccw projected
  arc A2 (5.0994, 32.5155) -> (5.2928, 32.6373) centre (5.0776, 32.7645) ccw projected
  line L8 (5.0994, 32.5155) -> (4.7538, 32.4853) projected
  arc A3 (4.7538, 32.4853) -> (4.5256, 32.2362) centre (4.7756, 32.2362) ccw projected
  line L9 (4.5256, 32.2362) -> (4.5256, 31.7838) projected
  arc A4 (4.5256, 31.7838) -> (4.7538, 31.5348) centre (4.7756, 31.7838) ccw projected
  line L10 (4.7538, 31.5348) -> (5.1203, 31.5027) projected
  arc A5 (5.3101, 31.3868) -> (5.1203, 31.5027) centre (5.0985, 31.2536) ccw projected
  arc A6 (5.3101, 31.3868) -> (5.8704, 30.9159) centre (6.3256, 32.0262) ccw projected
  arc A7 (6.0256, 30.6846) -> (5.8704, 30.9159) centre (5.7756, 30.6846) ccw projected
  line L11 (6.0256, 30.6846) -> (6.0256, 30.01) projected
  line L12 (6.0256, 30.01) -> (5.5256, 29.51) projected
  line L13 (5.5256, 29.51) -> (-5.4744, 29.51) projected
  line L14 (-5.4744, 29.51) -> (-5.9744, 30.01) projected
  line L15 (-5.9744, 30.01) -> (-5.9744, 30.6846) projected
  arc A8 (-5.8192, 30.9159) -> (-5.9744, 30.6846) centre (-5.7244, 30.6846) ccw projected
  arc A9 (-5.8192, 30.9159) -> (-5.259, 31.3868) centre (-6.2744, 32.0262) ccw projected
  arc A10 (-5.0692, 31.5027) -> (-5.259, 31.3868) centre (-5.0474, 31.2536) ccw projected
  line L16 (-5.0692, 31.5027) -> (-4.7026, 31.5347) projected
  arc A11 (-4.7026, 31.5347) -> (-4.4744, 31.7838) centre (-4.7244, 31.7838) ccw projected
  line L17 (-4.4744, 31.7838) -> (-4.4744, 32.2362) projected
  arc A12 (-4.4744, 32.2362) -> (-4.7026, 32.4853) centre (-4.7244, 32.2362) ccw projected
  line L18 (-4.7026, 32.4853) -> (-5.0482, 32.5155) projected
  arc A13 (-5.2416, 32.6373) -> (-5.0482, 32.5155) centre (-5.0265, 32.7645) ccw projected
  arc A14 (-5.2416, 32.6373) -> (-5.8192, 33.1366) centre (-6.2744, 32.0262) ccw projected
  arc A15 (-5.9744, 33.3679) -> (-5.8192, 33.1366) centre (-5.7244, 33.3679) ccw projected
  line L19 (-5.9744, 33.3679) -> (-5.9744, 34.51) projected
  line L20 (-5.9744, 34.51) -> (-12.5744, 34.51) projected
  line L21 (-12.5744, 34.51) -> (-13.1744, 33.91) projected
  circle A16 centre (-6.8744, 27.505) radius 2.1 projected
  circle A17 centre (6.9256, 27.505) radius 2.1 projected
  line L22 (-6.4744, 28.46) -> (6.5256, 28.46)
  line L23 (6.5256, 28.46) -> (6.5256, 59.0305)
  line L24 (6.5256, 59.0305) -> (-6.4744, 59.0305)
  line L25 (-6.4744, 59.0305) -> (-6.4744, 28.46)
  point P0 (7.4556, 24.63)
  dimension "d99" = 0.5
  dimension "d100" = 0.5
extrude "Extrusion19" cut sketch "Sketch21" against normal through all contours L25 L24 L23 L6 L7 A0 A1 A2 L8 A3 L9 A4 L10 A5 A6 A7 L11 L12 L13 L14 L15 A8 A9 A10 L16 A11 L17 A12 L18 A13 A14 A15 L19 L20 | L20 L19 A15 A14 A13 L18 A12 L17 A11 L16 A10 A9 A8 L15 L14 L13 L12 L11 A7 A6 A5 L10 A4 L9 A3 L8 A2 A1 A0 L7 L6 L23 A17 L22 A16 L25 | A16 L22 L25 | A17 L23 L22 picked at (-5.5817, 28.592) picked at (5.6329, 28.592)
sketch "Skizze24" plane through (-7.4556, -11.4352, 24.63) normal (0, 1, 0) x (1, 0, 0)
  circle A0 centre (-6.4952, 13.46) radius 4 projected
  line L0 (0, 5.96) -> (-3.2476, 11.585) construction
  line L1 (-3.2476, 11.585) -> (3.2476, 11.585) construction
  line L2 (3.2476, 11.585) -> (0, 5.96) construction
  circle A1 centre (0, 9.71) radius 1.875 construction
  circle A2 centre (0, 9.71) radius 1.5
  point P0 (7.4556, 24.63)
  dimension "d118" = 3
extrude "Extrusion22" cut sketch "Skizze24" against normal blind 10 contours A2
sketch "Skizze25" plane through (-7.4556, -11.4352, 24.63) normal (0, 1, 0) x (1, 0, 0)
  circle A0 centre (-11.0825, 81.36) radius 2.45 projected
  circle A1 centre (0, 56.5203) radius 2.45 projected
  circle A2 centre (11.0314, 81.36) radius 2.45 projected
  line L0 (5.945, 49.7974) -> (5.945, 47.4855) projected
  line L1 (5.945, 47.4855) -> (9.2297, 47.4855) projected
  arc A3 (10.033, 47.4855) -> (9.2297, 47.4855) centre (9.6314, 48.8267) ccw projected
  line L2 (10.033, 47.4855) -> (13.4972, 47.4855) projected
  line L3 (13.4972, 47.4855) -> (15, 55.86) projected
  line L4 (15, 55.86) -> (15, 85.86) projected
  line L5 (15, 85.86) -> (-15, 85.86) projected
  line L6 (-15, 85.86) -> (-15, 55.86) projected
  line L7 (-15, 55.86) -> (-13.5429, 47.4855) projected
  line L8 (-13.5429, 47.4855) -> (-10.0842, 47.4855) projected
  arc A4 (-9.2809, 47.4855) -> (-10.0842, 47.4855) centre (-9.6825, 48.8267) ccw projected
  line L9 (-9.2809, 47.4855) -> (-5.9961, 47.4855) projected
  line L10 (-5.9961, 47.4855) -> (-5.9961, 49.7974) projected
  line L11 (-5.9961, 49.7974) -> (5.945, 49.7974) projected
  circle A5 centre (0, 70.86) radius 10.5 projected
  circle A6 centre (-9.6825, 53.8267) radius 1.4 projected
  circle A7 centre (9.6314, 53.8267) radius 1.4 projected
  circle A8 centre (9.6314, 48.8267) radius 1.4
  circle A9 centre (-9.6825, 48.8267) radius 1.4
  point P0 (7.4556, 24.63)
  point P1 (-10.0842, 47.4855)
  point P2 (-9.2809, 47.4855)
extrude "Extrusion23" cut sketch "Skizze25" against normal blind 10 contours A3 A8 | A9 A4 | A6 | A7
ref_plane "Arbeitsebene9" through (-7.4556, -16.4352, 6.7533) normal (1, 0, 0) x (0, 0, -1)
ref_plane "Arbeitsebene10" through (-7.4556, -16.4352, -32.6831) normal (-1, 0, 0) x (0, 0, 1)
sketch "Skizze26" plane through (-7.4556, -11.4352, 24.63) normal (0, 1, 0) x (1, 0, 0)
  circle A0 centre (0, 9.71) radius 1.5 projected
  line L0 (-1.5877, 6.96) -> (-3.1754, 9.71)
  line L1 (-3.1754, 9.71) -> (-1.5877, 12.46)
  line L2 (-1.5877, 12.46) -> (1.5877, 12.46)
  line L3 (1.5877, 12.46) -> (3.1754, 9.71)
  line L4 (3.1754, 9.71) -> (1.5877, 6.96)
  line L5 (1.5877, 6.96) -> (-1.5877, 6.96)
  line L6 (3.4952, -3.79) -> (-3.4952, -3.79) projected
  point P0 (7.4556, 24.63)
  point P1 (-1.199, 6.96)
  point P2 (1.199, 6.96)
  point P3 (1.7821, 7.2967)
  point P4 (2.981, 9.3733)
  point P5 (2.981, 10.0467)
  point P6 (1.7821, 12.1233)
  point P7 (1.199, 12.46)
  point P8 (-1.199, 12.46)
  point P9 (-1.7821, 12.1233)
  point P10 (-2.981, 10.0467)
  point P11 (-2.981, 9.3733)
  point P12 (-1.7821, 7.2967)
  dimension "d124" = 5.5
extrude "Extrusion24" cut sketch "Skizze26" against normal blind 4
sketch "Skizze27" plane through (9.0396, -16.4352, 6.7533) normal (0.8575, 0, 0.5145) x (0.5145, 0, -0.8575)
  line L0 (-17.1233, 5) -> (-13.9483, 5) projected
  line L1 (-17.1233, 5) -> (-17.1233, 1) projected
  line L2 (-17.1233, 1) -> (-13.9483, 1) projected
  line L3 (-13.9483, 5) -> (-13.9483, 1) projected
  circle A0 centre (-15.5358, 2.5683) radius 1.4
  point P0 (1.1401, 16.4352)
  dimension "d127" = 2.8
extrude "Extrusion25" cut sketch "Skizze27" along normal mid plane 20 contours A0
pattern_circular "Runde Anordnung1" count 2 over 120 about axis through (-7.4556, -11.4352, 14.92) along (0, -1, 0) of "Extrusion25"
sketch "Skizze28" plane through (-7.4556, -11.4352, 24.63) normal (0, 1, 0) x (1, 0, 0)
  line L0 (-3.4952, -3.79) -> (-16.4952, 17.8767) projected
  line L1 (8.7935, -4.5498) -> (-5.7048, -4.5498)
  line L2 (-5.7048, -4.5498) -> (-5.7048, -0.1073)
  line L3 (-5.7048, -0.1073) -> (8.7935, -0.1073)
  line L4 (8.7935, -0.1073) -> (8.7935, -4.5498)
  point P0 (7.4556, 24.63)
extrude "Extrusion26" cut sketch "Skizze28" against normal blind 20
properties part number "30_Cube_Z_Focus_MGN_NEMA_slide_belt_part2"
